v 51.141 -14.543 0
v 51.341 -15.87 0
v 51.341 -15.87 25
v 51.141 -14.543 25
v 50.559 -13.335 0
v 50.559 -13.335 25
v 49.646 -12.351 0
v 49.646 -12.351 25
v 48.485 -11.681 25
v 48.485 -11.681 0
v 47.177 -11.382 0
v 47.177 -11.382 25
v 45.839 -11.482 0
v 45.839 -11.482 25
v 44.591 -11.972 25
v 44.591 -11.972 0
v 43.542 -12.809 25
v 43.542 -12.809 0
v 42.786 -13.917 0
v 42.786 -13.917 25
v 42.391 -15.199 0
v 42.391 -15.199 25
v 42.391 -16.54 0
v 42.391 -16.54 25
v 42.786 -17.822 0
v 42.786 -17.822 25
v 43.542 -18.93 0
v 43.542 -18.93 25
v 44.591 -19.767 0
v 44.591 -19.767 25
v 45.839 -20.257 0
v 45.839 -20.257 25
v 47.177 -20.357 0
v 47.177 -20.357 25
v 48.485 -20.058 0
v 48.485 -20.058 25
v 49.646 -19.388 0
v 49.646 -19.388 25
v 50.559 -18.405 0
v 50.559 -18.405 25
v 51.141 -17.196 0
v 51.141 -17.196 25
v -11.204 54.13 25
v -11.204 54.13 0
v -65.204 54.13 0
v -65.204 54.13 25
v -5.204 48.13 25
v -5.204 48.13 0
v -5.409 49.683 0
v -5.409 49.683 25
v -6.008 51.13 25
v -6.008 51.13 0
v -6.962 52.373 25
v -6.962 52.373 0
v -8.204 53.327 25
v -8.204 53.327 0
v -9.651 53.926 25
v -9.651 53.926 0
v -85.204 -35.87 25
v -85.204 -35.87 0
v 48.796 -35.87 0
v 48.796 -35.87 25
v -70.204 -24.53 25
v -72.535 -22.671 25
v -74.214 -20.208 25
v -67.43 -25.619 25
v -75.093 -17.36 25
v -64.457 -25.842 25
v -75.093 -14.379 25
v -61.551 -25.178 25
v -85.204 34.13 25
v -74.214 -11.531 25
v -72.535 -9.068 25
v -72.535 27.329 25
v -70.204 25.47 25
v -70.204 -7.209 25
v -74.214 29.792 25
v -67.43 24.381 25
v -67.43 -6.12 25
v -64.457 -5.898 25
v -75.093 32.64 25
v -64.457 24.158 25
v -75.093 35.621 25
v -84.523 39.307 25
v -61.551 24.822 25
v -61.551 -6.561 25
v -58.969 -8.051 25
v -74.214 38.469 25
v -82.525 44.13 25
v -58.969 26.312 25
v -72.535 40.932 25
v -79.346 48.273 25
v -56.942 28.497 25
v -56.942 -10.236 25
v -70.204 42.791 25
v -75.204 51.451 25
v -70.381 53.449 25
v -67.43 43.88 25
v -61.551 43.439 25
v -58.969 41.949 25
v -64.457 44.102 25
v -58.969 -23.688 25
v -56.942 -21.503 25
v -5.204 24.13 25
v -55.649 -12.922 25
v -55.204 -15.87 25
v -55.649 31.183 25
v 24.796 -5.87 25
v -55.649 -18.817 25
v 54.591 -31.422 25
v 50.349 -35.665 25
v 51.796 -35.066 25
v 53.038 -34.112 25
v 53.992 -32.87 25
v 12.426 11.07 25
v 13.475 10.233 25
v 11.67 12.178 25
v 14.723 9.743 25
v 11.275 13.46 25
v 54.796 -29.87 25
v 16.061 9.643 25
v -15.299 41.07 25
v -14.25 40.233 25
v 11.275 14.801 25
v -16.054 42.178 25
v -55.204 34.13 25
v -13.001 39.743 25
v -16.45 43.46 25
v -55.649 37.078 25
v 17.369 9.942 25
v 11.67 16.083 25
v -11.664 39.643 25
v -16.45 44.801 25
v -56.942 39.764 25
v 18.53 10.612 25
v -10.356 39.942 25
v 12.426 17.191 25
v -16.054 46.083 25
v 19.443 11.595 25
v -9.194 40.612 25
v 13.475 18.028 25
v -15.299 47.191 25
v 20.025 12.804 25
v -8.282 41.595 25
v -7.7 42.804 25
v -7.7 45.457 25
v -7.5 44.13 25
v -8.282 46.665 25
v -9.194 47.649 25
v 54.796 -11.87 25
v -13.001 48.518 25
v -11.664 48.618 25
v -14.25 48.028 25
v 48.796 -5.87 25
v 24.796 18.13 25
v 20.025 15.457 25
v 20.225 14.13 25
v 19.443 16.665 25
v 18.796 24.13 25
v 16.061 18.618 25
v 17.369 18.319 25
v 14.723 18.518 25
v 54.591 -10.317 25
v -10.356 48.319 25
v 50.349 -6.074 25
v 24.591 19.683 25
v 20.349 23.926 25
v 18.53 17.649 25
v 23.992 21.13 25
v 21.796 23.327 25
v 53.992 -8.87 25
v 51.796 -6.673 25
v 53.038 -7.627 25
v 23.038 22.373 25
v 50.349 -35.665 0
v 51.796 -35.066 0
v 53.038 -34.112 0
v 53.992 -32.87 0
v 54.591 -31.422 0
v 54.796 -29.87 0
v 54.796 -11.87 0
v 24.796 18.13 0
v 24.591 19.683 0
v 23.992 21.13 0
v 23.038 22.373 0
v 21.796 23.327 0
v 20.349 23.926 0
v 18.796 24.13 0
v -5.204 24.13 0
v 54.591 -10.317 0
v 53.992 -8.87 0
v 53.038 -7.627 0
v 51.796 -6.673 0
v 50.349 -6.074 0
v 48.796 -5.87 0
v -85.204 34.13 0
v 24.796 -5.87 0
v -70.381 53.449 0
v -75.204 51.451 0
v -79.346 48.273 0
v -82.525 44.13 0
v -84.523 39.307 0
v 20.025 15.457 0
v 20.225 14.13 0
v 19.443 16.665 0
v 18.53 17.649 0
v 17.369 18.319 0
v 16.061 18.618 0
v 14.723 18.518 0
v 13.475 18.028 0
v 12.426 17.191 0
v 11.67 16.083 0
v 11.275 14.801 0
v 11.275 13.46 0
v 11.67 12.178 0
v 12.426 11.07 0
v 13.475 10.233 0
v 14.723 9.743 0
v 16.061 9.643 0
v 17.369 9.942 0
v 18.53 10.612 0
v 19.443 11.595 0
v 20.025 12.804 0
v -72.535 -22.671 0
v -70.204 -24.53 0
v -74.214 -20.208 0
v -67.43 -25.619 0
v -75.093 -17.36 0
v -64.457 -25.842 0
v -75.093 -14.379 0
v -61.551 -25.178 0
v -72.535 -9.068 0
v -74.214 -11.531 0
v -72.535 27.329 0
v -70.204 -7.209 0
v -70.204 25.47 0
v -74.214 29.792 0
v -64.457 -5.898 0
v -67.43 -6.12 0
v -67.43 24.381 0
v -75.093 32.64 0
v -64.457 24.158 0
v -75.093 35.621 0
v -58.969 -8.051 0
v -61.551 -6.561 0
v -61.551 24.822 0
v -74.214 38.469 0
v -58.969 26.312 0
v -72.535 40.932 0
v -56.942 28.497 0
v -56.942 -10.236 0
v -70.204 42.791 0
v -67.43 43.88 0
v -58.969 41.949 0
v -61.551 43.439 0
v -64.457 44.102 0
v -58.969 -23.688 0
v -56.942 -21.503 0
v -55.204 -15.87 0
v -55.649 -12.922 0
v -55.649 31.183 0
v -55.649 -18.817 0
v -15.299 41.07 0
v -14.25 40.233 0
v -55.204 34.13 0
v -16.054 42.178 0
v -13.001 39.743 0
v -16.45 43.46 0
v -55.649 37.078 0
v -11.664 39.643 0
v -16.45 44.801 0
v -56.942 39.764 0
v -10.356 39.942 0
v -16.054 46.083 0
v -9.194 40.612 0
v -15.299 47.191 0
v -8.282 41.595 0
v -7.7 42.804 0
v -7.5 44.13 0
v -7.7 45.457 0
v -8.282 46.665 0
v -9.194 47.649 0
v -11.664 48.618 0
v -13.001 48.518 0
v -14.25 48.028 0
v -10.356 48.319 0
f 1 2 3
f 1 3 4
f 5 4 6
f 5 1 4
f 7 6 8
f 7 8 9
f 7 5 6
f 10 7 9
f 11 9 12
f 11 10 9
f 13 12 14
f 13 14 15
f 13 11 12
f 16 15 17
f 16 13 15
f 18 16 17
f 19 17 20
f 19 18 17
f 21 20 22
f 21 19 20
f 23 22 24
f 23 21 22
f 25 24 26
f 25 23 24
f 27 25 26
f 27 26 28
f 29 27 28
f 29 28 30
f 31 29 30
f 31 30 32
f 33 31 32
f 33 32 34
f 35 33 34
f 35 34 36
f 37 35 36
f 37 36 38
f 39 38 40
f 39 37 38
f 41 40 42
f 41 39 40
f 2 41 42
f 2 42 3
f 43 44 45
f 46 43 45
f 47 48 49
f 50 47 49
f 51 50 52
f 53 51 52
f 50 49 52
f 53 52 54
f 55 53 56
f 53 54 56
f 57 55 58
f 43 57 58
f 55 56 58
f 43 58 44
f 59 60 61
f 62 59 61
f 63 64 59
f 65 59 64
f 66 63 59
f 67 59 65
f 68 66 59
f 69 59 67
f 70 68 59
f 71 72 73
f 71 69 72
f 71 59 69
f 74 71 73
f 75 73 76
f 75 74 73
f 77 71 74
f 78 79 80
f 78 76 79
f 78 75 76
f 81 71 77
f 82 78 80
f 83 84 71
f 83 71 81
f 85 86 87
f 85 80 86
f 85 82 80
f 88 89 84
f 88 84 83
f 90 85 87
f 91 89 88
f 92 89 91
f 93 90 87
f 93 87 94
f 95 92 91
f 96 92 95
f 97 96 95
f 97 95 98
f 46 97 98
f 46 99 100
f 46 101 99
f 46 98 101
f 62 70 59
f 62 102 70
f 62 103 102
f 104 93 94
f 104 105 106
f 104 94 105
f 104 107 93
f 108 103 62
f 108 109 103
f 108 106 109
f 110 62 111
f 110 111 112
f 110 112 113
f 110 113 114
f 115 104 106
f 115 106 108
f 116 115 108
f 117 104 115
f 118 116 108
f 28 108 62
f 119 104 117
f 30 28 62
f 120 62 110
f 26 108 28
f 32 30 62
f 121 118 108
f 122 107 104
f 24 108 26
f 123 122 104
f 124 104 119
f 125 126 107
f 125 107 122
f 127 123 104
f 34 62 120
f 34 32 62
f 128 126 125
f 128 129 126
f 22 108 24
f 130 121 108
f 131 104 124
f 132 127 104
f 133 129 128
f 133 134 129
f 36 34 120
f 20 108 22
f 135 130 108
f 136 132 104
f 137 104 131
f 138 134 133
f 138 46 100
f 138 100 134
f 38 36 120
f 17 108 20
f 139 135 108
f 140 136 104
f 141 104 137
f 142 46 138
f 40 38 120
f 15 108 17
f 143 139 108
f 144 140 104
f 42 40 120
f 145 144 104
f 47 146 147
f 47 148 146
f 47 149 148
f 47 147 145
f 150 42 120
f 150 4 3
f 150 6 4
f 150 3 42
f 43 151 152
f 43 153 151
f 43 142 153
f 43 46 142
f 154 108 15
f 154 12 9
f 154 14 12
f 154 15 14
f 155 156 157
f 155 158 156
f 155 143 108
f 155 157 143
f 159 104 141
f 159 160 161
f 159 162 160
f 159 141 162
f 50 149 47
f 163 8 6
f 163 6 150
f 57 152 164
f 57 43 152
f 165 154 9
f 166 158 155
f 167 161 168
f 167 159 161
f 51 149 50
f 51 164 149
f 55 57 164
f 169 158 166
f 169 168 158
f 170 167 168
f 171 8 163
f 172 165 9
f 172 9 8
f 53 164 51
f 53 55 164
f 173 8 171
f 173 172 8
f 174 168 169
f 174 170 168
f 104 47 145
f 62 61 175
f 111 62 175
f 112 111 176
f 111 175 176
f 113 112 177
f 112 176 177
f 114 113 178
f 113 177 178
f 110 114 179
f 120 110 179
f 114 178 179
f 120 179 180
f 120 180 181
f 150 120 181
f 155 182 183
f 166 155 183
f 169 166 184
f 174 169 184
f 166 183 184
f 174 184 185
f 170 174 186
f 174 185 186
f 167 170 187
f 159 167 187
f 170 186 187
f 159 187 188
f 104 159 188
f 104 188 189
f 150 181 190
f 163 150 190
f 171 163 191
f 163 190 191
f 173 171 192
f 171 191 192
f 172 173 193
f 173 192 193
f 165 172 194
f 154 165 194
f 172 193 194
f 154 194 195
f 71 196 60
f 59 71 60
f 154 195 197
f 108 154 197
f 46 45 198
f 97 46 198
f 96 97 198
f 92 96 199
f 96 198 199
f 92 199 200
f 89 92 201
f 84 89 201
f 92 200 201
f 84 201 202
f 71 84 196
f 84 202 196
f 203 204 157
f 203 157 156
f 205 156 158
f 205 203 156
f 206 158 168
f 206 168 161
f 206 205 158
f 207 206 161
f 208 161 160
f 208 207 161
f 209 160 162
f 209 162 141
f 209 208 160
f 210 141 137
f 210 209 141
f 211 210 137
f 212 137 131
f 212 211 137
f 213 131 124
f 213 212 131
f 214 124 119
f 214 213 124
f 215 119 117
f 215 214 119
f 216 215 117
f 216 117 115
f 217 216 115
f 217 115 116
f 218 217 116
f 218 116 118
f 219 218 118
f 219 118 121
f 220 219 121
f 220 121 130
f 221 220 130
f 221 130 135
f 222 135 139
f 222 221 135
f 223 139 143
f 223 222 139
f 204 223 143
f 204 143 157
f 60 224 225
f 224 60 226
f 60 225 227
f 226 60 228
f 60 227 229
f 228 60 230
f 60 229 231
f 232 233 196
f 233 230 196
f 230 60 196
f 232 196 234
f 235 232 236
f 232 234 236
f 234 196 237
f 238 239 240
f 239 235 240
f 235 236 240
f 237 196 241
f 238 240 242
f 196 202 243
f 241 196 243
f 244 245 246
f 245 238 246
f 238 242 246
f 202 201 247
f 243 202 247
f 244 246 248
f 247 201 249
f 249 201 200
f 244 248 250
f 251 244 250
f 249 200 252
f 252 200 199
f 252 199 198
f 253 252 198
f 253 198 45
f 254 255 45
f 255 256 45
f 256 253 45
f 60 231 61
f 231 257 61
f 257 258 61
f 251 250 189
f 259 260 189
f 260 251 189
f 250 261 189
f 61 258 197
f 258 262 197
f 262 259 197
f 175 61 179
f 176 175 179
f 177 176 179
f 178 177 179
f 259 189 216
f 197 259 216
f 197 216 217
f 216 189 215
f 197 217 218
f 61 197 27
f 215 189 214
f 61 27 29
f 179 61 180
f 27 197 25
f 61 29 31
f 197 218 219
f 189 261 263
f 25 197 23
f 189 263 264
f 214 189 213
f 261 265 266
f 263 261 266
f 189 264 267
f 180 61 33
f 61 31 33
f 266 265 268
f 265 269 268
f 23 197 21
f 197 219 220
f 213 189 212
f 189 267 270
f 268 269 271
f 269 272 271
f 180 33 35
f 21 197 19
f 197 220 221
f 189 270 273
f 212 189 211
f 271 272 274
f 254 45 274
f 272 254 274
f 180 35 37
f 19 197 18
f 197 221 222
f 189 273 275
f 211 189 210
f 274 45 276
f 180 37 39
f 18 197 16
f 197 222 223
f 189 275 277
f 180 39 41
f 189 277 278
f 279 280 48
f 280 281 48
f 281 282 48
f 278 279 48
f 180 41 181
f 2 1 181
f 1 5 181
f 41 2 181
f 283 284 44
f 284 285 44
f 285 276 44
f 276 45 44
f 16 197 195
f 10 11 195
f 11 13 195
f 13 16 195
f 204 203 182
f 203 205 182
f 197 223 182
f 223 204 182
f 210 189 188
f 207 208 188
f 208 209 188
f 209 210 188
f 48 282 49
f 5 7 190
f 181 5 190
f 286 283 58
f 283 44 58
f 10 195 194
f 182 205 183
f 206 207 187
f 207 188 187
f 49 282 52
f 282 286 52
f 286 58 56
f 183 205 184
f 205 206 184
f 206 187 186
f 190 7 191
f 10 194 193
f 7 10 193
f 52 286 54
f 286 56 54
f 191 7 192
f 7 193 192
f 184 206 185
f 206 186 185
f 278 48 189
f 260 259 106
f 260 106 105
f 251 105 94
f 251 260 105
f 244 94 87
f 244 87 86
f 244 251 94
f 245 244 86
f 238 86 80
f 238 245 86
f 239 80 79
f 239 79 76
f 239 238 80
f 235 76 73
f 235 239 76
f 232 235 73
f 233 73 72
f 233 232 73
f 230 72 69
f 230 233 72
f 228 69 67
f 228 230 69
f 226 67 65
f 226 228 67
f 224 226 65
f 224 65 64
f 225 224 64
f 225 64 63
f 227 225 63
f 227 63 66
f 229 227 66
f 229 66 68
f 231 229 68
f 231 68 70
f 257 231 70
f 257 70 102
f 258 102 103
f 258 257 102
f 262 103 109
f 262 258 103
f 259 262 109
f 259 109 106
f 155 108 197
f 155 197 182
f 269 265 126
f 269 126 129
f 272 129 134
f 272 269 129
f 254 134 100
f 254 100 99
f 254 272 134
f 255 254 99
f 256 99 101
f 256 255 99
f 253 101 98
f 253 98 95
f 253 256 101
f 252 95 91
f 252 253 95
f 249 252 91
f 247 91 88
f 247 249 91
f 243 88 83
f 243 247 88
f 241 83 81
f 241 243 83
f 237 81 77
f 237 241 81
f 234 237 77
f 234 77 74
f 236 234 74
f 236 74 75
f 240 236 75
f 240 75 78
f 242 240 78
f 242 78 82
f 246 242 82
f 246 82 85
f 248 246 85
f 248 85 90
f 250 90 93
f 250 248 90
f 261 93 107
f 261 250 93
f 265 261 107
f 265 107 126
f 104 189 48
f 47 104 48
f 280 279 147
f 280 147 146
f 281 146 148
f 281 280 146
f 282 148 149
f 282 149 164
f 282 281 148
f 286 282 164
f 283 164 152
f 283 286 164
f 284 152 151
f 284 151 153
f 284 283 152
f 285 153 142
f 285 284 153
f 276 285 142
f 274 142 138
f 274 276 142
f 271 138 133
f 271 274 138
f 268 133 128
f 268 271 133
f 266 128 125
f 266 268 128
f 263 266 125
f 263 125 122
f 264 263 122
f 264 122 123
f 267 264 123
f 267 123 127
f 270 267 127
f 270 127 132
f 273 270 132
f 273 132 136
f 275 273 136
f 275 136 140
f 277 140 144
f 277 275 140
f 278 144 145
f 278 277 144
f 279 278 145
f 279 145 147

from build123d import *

# Parameters (mm, degrees)
F0_R     = 10
F0_R_2   = 4.5
F1_DEPTH = 25


with BuildPart() as f1:
    # F0 (on Top) → F1 (new body)
    with BuildSketch(Plane.XY):
        with BuildLine():
            ThreePointArc((-65.204328, 54.130437), (-79.346463, 48.272573), (-85.204328, 34.130437))
            Line((-85.204328, 34.130437), (-85.204328, -15.869563))
            ThreePointArc((-85.204328, -15.869563), (-79.346463, -30.011699), (-65.204328, -35.869563))
            Line((-65.204328, -35.869563), (48.795672, -35.869563))
            ThreePointArc((48.795672, -35.869563), (53.038313, -34.112204), (54.795672, -29.869563))
            Line((54.795672, -29.869563), (54.795672, -11.869563))
            ThreePointArc((54.795672, -11.869563), (53.038313, -7.626922), (48.795672, -5.869563))
            Line((48.795672, -5.869563), (24.795672, -5.869563))
            Line((24.795672, -5.869563), (24.795672, 18.130437))
            ThreePointArc((24.795672, 18.130437), (23.038313, 22.373078), (18.795672, 24.130437))
            Line((18.795672, 24.130437), (-5.204328, 24.130437))
            Line((-5.204328, 24.130437), (-5.204328, 48.130437))
            ThreePointArc((-5.204328, 48.130437), (-6.961687, 52.373078), (-11.204328, 54.130437))
            Line((-11.204328, 54.130437), (-65.204328, 54.130437))
        make_face()
        with Locations((-65.204328, -15.869563)):
            Circle(F0_R, mode=Mode.SUBTRACT)
        with Locations((46.84058, -15.869563)):
            Circle(F0_R_2, mode=Mode.SUBTRACT)
        with Locations((-65.204328, 34.130437)):
            Circle(F0_R, mode=Mode.SUBTRACT)
        with Locations((15.724638, 14.130437)):
            Circle(F0_R_2, mode=Mode.SUBTRACT)
        with Locations((-12, 44.130437)):
            Circle(F0_R_2, mode=Mode.SUBTRACT)
        with BuildLine():
            ThreePointArc((-65.204328, -35.869563), (-79.346463, -30.011699), (-85.204328, -15.869563))
            Line((-85.204328, -15.869563), (-85.204328, -35.869563))
            Line((-85.204328, -35.869563), (-65.204328, -35.869563))
        make_face()
    extrude(amount=F1_DEPTH)


solid = f1.part
